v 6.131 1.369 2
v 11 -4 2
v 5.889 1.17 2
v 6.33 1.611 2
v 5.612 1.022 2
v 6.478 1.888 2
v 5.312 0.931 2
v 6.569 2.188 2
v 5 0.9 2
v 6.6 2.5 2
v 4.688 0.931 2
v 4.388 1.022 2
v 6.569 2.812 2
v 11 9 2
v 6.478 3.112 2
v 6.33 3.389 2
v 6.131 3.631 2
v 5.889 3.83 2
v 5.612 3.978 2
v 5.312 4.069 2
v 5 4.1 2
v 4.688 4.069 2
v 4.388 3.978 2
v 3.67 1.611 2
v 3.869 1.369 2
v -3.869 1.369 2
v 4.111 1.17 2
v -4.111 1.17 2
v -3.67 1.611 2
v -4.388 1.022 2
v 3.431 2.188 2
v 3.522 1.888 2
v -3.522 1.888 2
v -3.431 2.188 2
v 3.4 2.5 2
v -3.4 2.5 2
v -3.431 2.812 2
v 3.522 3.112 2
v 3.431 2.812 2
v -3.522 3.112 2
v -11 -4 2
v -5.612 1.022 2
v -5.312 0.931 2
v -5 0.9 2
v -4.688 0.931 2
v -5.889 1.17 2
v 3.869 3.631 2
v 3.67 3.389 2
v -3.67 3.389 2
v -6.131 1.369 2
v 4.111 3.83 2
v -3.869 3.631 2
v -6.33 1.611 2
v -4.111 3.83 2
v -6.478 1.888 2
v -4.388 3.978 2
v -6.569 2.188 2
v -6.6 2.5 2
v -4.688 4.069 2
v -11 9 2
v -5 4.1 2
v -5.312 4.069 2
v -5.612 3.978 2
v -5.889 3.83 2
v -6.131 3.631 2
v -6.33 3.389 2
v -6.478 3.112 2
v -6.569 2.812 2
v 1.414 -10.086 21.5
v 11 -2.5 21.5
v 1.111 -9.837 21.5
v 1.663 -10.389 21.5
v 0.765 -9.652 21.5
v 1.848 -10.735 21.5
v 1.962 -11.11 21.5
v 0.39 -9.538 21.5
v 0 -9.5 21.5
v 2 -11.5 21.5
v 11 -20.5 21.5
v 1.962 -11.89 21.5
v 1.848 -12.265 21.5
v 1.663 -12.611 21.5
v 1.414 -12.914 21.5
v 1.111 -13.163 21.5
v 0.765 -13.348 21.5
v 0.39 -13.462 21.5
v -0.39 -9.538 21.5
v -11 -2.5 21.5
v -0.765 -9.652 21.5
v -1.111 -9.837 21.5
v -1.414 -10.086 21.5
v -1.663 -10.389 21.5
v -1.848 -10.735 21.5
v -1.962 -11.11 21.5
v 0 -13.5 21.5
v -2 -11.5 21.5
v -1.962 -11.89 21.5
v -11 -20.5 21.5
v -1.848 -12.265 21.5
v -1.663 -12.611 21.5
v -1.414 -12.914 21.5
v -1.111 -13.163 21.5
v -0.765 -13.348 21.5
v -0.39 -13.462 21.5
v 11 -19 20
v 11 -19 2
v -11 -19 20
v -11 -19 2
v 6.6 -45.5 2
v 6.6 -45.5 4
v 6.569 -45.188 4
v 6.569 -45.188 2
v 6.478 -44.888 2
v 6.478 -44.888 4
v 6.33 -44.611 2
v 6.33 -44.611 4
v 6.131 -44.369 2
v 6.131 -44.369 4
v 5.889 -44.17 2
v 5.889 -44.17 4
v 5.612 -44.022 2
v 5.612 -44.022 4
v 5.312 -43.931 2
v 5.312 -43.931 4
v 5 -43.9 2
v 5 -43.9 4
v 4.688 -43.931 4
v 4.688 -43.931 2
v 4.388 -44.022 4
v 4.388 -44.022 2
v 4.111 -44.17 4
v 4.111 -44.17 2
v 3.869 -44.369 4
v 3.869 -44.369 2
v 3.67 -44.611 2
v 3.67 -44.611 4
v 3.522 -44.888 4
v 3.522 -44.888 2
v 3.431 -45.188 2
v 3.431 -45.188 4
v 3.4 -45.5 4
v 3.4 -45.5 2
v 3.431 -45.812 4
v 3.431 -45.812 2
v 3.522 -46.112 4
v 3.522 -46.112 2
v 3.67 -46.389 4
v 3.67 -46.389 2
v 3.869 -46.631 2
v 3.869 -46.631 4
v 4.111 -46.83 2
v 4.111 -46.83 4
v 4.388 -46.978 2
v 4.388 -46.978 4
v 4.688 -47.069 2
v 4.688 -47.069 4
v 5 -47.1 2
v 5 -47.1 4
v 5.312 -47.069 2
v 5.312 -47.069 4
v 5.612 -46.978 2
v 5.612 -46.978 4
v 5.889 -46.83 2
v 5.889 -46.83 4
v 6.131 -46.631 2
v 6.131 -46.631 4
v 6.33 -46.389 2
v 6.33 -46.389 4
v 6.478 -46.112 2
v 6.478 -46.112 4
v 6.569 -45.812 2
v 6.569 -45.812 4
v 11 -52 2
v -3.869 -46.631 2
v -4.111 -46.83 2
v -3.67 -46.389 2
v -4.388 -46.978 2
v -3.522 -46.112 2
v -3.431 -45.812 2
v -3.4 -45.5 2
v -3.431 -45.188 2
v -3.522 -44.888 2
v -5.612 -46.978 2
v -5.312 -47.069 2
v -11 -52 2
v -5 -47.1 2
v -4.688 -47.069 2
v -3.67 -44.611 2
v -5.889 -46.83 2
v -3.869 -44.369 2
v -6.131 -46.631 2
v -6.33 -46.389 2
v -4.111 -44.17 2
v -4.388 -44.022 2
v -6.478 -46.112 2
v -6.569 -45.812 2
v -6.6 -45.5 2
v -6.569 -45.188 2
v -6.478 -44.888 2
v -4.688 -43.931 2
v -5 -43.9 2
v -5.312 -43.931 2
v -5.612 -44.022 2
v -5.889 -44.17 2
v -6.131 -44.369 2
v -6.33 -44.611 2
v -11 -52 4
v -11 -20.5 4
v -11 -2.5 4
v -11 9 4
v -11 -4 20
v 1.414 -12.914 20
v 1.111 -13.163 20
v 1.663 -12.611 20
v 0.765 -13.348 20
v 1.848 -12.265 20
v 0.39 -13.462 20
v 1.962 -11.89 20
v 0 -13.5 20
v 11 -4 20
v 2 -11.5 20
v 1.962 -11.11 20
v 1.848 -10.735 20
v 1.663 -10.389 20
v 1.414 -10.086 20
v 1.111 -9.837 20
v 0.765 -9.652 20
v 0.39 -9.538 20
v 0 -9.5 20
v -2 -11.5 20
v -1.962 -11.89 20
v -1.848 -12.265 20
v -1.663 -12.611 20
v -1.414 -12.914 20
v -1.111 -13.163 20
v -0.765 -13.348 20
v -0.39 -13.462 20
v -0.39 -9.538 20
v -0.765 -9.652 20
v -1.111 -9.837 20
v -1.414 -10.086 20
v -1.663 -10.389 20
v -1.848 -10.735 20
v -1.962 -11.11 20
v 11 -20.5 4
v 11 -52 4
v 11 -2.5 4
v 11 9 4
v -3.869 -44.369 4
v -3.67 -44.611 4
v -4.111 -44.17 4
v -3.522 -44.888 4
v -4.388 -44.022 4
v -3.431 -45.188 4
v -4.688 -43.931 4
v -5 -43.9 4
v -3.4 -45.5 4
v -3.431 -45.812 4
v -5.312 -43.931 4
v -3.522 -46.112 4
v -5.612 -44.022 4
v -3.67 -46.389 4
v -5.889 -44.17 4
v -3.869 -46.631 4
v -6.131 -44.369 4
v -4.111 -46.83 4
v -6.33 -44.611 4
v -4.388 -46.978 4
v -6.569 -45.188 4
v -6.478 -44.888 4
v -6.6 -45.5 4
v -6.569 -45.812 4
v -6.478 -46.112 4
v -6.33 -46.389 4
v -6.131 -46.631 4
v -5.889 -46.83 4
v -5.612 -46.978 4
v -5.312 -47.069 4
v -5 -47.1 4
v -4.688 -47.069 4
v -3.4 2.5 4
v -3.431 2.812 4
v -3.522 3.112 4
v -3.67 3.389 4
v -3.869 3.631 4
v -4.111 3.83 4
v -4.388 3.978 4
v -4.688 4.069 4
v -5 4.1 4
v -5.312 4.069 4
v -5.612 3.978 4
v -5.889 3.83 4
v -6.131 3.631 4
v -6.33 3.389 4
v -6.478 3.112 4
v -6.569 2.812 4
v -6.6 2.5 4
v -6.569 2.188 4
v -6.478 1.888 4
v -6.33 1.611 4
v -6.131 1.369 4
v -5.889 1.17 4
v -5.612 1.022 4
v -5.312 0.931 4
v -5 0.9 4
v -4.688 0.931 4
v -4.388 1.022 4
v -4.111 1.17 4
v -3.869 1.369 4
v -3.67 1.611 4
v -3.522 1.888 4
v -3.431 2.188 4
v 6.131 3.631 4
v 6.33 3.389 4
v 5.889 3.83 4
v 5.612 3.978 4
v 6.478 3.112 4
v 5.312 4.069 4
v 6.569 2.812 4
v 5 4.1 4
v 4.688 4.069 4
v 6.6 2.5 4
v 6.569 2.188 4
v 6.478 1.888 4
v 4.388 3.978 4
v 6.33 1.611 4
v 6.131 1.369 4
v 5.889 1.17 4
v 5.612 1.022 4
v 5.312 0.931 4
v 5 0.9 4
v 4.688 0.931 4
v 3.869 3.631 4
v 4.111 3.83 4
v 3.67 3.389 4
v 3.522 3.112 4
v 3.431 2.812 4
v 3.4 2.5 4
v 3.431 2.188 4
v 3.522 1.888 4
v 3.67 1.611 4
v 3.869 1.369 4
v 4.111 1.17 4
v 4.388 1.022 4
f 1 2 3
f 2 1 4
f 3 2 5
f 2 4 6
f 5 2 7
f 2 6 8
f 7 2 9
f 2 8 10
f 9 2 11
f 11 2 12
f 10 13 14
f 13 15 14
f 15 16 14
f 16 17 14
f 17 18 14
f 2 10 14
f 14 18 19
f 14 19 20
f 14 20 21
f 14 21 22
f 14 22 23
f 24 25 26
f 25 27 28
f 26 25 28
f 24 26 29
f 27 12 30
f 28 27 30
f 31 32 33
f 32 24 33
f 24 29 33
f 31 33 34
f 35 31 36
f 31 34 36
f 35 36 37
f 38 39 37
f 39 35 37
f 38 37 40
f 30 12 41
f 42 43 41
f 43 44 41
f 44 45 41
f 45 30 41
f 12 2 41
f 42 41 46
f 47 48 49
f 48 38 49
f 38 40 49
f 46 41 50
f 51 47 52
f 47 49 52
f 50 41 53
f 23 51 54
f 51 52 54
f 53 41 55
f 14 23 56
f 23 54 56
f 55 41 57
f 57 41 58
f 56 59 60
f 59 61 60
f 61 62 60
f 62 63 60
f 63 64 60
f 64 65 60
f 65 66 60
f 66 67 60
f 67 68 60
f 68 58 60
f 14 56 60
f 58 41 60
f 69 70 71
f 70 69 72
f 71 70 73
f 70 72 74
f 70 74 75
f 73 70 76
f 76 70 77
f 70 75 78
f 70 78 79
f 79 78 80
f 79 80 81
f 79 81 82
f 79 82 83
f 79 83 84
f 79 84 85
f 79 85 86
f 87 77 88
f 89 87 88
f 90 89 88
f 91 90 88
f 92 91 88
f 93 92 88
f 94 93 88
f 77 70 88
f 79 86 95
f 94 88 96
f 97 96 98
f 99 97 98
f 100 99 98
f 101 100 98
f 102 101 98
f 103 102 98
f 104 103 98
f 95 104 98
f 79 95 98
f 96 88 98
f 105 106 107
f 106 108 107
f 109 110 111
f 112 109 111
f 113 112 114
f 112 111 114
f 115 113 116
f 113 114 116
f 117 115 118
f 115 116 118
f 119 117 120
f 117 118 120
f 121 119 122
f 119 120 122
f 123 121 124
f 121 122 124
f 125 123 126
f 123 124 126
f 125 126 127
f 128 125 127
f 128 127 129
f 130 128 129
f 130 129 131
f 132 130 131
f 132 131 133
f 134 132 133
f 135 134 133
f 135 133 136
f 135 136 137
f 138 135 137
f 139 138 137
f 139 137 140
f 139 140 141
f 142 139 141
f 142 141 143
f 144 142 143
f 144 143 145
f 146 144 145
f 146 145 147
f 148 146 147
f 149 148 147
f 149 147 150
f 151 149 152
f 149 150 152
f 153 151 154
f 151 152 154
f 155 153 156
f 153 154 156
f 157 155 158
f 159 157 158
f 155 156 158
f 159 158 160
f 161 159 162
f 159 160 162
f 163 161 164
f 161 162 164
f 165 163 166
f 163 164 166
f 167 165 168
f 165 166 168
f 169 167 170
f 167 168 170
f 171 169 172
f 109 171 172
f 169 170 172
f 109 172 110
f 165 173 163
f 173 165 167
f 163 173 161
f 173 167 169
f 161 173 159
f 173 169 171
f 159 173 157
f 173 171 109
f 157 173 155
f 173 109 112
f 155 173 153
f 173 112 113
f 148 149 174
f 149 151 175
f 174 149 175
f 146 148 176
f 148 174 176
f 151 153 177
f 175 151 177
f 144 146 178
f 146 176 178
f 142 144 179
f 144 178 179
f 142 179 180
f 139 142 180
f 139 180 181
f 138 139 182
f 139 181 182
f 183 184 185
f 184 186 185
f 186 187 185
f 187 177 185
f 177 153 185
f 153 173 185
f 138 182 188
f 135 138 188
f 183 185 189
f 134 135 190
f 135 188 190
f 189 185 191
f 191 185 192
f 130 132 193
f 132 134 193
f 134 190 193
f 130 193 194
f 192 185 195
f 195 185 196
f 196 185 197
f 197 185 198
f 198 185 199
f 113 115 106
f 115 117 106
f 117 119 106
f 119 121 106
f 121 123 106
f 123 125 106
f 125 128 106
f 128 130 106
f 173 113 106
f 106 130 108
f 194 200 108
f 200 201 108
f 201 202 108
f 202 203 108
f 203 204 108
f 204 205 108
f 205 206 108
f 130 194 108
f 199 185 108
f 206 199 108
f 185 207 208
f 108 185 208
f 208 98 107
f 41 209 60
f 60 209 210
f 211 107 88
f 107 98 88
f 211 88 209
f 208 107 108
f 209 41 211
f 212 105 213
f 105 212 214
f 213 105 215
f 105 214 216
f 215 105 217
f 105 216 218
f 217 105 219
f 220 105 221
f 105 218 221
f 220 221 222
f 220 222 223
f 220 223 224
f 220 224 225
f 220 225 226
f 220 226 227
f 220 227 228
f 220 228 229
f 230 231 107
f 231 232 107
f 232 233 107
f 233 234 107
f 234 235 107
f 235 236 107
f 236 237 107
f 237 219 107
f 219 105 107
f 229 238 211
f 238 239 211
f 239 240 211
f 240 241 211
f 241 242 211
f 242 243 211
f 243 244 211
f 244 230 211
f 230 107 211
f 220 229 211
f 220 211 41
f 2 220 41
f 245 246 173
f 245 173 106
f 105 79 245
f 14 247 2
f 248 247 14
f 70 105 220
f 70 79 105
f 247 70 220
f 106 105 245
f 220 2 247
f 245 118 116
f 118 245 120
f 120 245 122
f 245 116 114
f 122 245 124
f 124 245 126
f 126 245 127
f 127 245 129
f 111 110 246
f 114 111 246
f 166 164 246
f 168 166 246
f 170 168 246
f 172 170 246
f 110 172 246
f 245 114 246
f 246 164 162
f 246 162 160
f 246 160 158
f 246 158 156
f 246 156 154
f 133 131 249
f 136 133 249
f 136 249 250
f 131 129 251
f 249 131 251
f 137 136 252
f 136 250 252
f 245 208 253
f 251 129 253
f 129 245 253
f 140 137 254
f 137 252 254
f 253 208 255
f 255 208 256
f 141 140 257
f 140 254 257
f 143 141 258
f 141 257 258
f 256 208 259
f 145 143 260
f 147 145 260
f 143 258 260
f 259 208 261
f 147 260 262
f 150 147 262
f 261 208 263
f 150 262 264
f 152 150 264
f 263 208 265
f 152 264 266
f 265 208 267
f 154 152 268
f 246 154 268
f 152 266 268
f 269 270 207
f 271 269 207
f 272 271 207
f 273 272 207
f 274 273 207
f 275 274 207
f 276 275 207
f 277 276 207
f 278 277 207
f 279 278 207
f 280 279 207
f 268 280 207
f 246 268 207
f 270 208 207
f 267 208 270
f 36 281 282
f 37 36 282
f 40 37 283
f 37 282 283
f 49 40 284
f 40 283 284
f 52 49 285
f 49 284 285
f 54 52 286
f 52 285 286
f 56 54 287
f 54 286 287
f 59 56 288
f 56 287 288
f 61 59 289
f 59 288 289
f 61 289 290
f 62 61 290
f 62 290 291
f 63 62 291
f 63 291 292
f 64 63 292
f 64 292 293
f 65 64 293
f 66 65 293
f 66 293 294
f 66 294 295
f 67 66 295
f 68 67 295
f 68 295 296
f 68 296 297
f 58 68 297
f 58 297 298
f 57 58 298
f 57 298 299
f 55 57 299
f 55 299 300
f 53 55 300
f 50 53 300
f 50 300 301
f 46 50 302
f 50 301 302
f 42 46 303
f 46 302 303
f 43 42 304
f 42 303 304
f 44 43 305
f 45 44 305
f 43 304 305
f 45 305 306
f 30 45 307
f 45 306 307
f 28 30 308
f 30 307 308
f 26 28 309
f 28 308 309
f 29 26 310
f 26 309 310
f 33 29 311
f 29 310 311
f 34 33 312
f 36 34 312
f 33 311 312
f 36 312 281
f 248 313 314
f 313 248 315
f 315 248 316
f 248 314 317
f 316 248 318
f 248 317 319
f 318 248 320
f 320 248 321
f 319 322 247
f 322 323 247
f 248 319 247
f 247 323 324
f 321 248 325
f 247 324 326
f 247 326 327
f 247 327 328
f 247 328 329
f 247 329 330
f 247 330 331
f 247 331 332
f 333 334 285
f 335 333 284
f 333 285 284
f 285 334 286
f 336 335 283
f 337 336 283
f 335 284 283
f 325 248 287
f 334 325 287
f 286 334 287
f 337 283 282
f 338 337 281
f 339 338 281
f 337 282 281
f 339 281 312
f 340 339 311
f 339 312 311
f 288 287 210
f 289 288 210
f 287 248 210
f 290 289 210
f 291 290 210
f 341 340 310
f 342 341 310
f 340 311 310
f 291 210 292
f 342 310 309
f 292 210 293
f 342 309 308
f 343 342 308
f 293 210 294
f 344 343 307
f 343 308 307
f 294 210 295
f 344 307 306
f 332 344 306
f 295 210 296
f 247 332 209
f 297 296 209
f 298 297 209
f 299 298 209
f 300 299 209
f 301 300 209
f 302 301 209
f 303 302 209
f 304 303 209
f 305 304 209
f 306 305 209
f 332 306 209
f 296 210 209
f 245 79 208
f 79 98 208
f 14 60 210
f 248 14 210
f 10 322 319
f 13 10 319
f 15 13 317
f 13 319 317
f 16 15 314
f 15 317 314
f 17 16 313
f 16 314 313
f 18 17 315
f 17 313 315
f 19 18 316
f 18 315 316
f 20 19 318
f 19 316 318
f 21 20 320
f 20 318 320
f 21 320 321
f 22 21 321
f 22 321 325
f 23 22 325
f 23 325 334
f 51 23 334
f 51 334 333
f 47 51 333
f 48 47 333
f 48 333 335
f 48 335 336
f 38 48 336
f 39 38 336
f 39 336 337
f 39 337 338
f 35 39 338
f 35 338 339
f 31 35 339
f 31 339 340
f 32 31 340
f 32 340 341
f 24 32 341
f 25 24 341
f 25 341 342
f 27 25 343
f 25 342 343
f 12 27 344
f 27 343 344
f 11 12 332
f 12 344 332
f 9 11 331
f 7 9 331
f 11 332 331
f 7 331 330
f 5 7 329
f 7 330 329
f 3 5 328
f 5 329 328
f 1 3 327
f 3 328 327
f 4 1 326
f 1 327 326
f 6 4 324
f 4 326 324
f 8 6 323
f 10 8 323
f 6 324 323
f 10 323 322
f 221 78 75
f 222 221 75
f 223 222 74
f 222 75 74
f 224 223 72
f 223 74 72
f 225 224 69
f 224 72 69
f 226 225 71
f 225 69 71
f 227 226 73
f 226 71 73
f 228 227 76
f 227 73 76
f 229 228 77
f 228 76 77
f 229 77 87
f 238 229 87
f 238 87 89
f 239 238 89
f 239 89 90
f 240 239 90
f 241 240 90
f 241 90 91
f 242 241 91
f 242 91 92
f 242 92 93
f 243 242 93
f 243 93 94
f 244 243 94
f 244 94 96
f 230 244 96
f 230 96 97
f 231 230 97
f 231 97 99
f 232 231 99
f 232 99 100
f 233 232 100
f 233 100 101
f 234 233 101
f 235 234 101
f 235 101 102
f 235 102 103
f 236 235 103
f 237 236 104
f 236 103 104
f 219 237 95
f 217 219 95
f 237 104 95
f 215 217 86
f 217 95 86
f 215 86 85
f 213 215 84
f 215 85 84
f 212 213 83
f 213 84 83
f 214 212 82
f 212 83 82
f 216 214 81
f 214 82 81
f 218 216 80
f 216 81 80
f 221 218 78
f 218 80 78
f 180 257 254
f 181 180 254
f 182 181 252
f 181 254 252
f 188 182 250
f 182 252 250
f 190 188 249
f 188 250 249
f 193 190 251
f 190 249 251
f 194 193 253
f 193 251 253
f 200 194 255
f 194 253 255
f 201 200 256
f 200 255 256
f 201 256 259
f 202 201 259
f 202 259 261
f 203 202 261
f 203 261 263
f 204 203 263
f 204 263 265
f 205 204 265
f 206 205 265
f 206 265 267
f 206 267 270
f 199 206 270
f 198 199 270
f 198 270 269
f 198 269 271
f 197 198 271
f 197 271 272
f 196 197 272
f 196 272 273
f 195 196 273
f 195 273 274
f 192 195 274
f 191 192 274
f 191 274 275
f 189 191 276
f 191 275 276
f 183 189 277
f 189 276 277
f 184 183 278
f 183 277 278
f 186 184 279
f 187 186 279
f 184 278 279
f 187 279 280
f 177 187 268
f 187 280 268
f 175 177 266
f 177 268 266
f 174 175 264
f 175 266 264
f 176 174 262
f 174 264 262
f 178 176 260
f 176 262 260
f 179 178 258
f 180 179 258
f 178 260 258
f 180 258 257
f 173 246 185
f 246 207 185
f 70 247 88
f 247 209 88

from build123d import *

# Parameters (mm, degrees)
SKETCH053_R      = 1.6
SKETCH053_R_2    = 2
EXTRUDE045_DEPTH = 30
EXTRUDE044_DEPTH = 11


with BuildPart() as extrude045:
    # Sketch053 → Extrude045 (new body)
    with BuildSketch(Plane.XY.offset(23)):
        with Locations((-5, 2.5)):
            Circle(SKETCH053_R)
        with Locations((5, 2.5)):
            Circle(SKETCH053_R)
        with Locations((-5, -45.5)):
            Circle(SKETCH053_R)
        with Locations((5, -45.5)):
            Circle(SKETCH053_R)
        with Locations((0, -11.5)):
            Circle(SKETCH053_R_2)
    extrude(amount=-EXTRUDE045_DEPTH)


with BuildPart() as dummy_servo:
    # Sketch052 → Extrude044 (new body, symmetric)
    with BuildSketch(Plane(origin=(0, 0, 0), x_dir=(0, -1, 0), z_dir=(-1, 0, 0))):
        Polygon((-9, 2), (-9, 4), (2.5, 4), (2.5, 21.5), (20.5, 21.5), (20.5, 4), (52, 4), (52, 2), (19, 2), (19, 20), (4, 20), (4, 2), align=None)
    extrude(amount=EXTRUDE044_DEPTH, both=True)

    # Cut012: cut Extrude045
    add(extrude045.part, mode=Mode.SUBTRACT)


solid = dummy_servo.part
